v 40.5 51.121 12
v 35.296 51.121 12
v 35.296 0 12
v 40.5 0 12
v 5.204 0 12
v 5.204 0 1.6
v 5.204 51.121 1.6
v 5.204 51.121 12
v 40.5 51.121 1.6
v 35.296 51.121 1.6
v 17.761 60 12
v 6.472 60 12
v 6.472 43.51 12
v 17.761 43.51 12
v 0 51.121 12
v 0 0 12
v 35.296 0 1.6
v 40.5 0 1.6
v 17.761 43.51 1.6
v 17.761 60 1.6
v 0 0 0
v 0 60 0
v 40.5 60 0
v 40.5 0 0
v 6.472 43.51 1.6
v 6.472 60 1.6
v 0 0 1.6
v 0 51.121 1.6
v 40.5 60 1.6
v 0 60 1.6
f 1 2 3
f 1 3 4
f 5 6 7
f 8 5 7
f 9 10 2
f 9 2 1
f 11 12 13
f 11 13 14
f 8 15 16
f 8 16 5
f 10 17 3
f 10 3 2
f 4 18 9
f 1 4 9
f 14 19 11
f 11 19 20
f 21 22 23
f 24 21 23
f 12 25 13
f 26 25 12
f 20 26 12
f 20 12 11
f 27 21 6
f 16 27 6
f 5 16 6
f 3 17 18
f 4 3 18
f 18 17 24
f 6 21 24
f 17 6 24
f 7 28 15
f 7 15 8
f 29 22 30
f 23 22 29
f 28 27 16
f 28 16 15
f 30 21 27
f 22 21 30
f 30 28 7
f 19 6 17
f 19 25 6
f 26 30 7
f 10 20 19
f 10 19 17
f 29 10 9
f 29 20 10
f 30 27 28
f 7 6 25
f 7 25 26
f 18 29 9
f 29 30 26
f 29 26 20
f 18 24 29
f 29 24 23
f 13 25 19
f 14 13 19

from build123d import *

# Parameters (mm, degrees)
F0_W     = 40.5
F0_H     = 60
F1_DEPTH = 1.6
F2_W     = 5.203603
F2_H     = 51.121294
F2_W_2   = 11.289145
F2_H_2   = 16.489763
F3_DEPTH = 12


with BuildPart() as f1:
    # F0 (on Top) → F1 (new body)
    with BuildSketch(Plane.XY):
        with Locations((20.25, 30)):
            Rectangle(F0_W, F0_H)
    extrude(amount=F1_DEPTH)

    # F2 (on Top) → F3 (join)
    with BuildSketch(Plane.XY):
        with Locations((2.601802, 25.560647)):
            Rectangle(F2_W, F2_H)
        with Locations((37.898198, 25.560647)):
            Rectangle(F2_W, F2_H)
        with Locations((12.116618, 51.755118)):
            Rectangle(F2_W_2, F2_H_2)
    extrude(amount=F3_DEPTH)


solid = f1.part
